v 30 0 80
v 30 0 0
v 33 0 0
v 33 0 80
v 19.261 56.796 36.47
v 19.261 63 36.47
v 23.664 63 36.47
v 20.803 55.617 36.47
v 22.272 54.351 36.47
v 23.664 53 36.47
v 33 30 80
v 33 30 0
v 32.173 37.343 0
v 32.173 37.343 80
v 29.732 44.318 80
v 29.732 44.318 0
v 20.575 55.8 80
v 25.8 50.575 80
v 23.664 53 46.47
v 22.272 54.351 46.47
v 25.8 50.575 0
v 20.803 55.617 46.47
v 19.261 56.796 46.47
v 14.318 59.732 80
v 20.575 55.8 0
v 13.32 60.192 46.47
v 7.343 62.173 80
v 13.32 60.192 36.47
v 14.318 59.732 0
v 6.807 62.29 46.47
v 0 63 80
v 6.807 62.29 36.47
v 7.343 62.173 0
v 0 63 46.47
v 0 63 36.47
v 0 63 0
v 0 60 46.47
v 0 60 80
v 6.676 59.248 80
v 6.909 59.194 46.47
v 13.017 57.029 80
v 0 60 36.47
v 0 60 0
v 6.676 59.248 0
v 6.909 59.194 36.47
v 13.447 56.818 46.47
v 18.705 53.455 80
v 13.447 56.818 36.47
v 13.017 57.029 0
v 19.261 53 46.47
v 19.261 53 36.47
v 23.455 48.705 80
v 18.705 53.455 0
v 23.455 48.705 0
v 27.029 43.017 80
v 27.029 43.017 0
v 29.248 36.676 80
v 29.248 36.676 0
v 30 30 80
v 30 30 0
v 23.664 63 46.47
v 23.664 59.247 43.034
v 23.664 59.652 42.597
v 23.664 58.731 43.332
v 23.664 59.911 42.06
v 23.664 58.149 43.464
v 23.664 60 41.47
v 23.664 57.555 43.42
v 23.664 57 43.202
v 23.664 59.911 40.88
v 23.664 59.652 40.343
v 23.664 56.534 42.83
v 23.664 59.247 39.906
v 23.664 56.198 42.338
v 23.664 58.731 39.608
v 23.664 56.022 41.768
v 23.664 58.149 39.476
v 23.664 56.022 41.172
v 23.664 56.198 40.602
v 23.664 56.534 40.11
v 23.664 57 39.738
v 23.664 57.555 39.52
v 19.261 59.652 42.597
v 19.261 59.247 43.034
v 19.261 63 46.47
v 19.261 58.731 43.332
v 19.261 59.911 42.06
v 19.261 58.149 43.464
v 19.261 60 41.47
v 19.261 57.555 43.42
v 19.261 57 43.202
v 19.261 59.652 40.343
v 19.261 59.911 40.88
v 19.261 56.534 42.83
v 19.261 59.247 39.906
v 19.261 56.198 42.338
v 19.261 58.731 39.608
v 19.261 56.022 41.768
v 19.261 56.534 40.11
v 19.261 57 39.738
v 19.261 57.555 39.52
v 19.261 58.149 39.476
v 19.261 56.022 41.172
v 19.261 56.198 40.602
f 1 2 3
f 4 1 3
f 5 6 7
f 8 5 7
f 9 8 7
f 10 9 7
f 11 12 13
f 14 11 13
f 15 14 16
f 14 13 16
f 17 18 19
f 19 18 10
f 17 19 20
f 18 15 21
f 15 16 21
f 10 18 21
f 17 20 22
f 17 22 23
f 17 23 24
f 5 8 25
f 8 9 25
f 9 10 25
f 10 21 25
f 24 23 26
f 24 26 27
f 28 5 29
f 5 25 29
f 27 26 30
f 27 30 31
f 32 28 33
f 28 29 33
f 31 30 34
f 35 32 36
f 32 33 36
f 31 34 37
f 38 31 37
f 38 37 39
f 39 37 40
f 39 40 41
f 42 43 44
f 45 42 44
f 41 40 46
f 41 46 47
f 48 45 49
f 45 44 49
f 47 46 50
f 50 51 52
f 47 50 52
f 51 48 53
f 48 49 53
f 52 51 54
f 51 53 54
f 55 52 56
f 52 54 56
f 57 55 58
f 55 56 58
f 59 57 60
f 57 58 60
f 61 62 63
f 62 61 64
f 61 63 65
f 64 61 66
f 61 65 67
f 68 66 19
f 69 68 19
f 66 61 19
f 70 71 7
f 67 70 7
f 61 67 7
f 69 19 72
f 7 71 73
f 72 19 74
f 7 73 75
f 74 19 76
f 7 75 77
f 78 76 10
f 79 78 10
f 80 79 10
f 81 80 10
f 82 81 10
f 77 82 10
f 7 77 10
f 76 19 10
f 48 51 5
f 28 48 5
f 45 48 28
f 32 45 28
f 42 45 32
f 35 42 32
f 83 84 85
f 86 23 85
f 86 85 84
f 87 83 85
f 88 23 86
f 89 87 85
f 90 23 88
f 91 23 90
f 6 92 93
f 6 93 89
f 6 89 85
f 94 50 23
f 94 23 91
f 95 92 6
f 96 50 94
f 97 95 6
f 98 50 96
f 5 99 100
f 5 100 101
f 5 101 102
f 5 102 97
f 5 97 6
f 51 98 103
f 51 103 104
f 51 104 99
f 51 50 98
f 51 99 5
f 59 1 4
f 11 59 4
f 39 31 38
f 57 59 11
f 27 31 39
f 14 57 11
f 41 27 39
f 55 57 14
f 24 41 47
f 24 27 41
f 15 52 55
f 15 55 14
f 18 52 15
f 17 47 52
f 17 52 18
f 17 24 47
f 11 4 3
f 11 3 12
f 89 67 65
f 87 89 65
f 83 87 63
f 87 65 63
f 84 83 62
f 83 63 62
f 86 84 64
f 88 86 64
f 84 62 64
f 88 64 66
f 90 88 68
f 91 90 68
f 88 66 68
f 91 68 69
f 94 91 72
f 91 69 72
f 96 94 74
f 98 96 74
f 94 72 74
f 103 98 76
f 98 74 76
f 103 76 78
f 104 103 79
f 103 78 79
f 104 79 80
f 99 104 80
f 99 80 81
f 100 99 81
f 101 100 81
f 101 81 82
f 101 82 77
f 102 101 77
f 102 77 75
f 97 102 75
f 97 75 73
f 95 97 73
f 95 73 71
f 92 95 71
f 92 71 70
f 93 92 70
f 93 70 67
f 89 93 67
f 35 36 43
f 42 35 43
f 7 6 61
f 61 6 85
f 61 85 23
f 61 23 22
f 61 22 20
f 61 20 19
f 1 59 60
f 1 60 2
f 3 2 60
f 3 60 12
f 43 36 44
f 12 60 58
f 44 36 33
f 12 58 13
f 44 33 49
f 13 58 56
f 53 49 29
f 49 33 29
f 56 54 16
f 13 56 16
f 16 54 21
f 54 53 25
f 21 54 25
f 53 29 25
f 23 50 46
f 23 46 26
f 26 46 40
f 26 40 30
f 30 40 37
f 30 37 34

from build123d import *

# Parameters (mm, degrees)
F1_DEPTH = 80
F2_W     = 10
F2_H     = 10
F3_DEPTH = 62.75
F4_DEPTH = 10
F5_R     = 2
F6_DEPTH = 25


with BuildPart() as f1:
    # F0 (on Top) → F1 (new body)
    with BuildSketch(Plane.XY):
        with BuildLine():
            ThreePointArc((0, 60), (21.2132034356, 51.2132034356), (30, 30))
            Line((30, 30), (30, 0))
            Line((30, 0), (33, 0))
            Line((33, 0), (33, 30))
            ThreePointArc((33, 30), (23.3345237792, 53.3345237792), (0, 63))
            Line((0, 63), (0, 60))
        make_face()
    extrude(amount=F1_DEPTH)

    # F2 (on Right) → F3 (cut)
    with BuildSketch(Plane.YZ):
        with Locations((58, 41.47)):
            Rectangle(F2_W, F2_H)
    extrude(amount=F3_DEPTH, mode=Mode.SUBTRACT)

    # F4 (add): a face of the model
    f4_faces = [f1.faces().sort_by_distance(p)[0] for p in [
        (21.4628397083, 53, 41.47),
    ]]
    extrude(f4_faces, amount=F4_DEPTH)

    # F5 (on face) → F6 (cut)
    with BuildSketch(Plane.YZ.offset(23.6643191324)):
        with Locations((58, 41.47)):
            Circle(F5_R)
    extrude(amount=-F6_DEPTH, mode=Mode.SUBTRACT)


solid = f1.part
